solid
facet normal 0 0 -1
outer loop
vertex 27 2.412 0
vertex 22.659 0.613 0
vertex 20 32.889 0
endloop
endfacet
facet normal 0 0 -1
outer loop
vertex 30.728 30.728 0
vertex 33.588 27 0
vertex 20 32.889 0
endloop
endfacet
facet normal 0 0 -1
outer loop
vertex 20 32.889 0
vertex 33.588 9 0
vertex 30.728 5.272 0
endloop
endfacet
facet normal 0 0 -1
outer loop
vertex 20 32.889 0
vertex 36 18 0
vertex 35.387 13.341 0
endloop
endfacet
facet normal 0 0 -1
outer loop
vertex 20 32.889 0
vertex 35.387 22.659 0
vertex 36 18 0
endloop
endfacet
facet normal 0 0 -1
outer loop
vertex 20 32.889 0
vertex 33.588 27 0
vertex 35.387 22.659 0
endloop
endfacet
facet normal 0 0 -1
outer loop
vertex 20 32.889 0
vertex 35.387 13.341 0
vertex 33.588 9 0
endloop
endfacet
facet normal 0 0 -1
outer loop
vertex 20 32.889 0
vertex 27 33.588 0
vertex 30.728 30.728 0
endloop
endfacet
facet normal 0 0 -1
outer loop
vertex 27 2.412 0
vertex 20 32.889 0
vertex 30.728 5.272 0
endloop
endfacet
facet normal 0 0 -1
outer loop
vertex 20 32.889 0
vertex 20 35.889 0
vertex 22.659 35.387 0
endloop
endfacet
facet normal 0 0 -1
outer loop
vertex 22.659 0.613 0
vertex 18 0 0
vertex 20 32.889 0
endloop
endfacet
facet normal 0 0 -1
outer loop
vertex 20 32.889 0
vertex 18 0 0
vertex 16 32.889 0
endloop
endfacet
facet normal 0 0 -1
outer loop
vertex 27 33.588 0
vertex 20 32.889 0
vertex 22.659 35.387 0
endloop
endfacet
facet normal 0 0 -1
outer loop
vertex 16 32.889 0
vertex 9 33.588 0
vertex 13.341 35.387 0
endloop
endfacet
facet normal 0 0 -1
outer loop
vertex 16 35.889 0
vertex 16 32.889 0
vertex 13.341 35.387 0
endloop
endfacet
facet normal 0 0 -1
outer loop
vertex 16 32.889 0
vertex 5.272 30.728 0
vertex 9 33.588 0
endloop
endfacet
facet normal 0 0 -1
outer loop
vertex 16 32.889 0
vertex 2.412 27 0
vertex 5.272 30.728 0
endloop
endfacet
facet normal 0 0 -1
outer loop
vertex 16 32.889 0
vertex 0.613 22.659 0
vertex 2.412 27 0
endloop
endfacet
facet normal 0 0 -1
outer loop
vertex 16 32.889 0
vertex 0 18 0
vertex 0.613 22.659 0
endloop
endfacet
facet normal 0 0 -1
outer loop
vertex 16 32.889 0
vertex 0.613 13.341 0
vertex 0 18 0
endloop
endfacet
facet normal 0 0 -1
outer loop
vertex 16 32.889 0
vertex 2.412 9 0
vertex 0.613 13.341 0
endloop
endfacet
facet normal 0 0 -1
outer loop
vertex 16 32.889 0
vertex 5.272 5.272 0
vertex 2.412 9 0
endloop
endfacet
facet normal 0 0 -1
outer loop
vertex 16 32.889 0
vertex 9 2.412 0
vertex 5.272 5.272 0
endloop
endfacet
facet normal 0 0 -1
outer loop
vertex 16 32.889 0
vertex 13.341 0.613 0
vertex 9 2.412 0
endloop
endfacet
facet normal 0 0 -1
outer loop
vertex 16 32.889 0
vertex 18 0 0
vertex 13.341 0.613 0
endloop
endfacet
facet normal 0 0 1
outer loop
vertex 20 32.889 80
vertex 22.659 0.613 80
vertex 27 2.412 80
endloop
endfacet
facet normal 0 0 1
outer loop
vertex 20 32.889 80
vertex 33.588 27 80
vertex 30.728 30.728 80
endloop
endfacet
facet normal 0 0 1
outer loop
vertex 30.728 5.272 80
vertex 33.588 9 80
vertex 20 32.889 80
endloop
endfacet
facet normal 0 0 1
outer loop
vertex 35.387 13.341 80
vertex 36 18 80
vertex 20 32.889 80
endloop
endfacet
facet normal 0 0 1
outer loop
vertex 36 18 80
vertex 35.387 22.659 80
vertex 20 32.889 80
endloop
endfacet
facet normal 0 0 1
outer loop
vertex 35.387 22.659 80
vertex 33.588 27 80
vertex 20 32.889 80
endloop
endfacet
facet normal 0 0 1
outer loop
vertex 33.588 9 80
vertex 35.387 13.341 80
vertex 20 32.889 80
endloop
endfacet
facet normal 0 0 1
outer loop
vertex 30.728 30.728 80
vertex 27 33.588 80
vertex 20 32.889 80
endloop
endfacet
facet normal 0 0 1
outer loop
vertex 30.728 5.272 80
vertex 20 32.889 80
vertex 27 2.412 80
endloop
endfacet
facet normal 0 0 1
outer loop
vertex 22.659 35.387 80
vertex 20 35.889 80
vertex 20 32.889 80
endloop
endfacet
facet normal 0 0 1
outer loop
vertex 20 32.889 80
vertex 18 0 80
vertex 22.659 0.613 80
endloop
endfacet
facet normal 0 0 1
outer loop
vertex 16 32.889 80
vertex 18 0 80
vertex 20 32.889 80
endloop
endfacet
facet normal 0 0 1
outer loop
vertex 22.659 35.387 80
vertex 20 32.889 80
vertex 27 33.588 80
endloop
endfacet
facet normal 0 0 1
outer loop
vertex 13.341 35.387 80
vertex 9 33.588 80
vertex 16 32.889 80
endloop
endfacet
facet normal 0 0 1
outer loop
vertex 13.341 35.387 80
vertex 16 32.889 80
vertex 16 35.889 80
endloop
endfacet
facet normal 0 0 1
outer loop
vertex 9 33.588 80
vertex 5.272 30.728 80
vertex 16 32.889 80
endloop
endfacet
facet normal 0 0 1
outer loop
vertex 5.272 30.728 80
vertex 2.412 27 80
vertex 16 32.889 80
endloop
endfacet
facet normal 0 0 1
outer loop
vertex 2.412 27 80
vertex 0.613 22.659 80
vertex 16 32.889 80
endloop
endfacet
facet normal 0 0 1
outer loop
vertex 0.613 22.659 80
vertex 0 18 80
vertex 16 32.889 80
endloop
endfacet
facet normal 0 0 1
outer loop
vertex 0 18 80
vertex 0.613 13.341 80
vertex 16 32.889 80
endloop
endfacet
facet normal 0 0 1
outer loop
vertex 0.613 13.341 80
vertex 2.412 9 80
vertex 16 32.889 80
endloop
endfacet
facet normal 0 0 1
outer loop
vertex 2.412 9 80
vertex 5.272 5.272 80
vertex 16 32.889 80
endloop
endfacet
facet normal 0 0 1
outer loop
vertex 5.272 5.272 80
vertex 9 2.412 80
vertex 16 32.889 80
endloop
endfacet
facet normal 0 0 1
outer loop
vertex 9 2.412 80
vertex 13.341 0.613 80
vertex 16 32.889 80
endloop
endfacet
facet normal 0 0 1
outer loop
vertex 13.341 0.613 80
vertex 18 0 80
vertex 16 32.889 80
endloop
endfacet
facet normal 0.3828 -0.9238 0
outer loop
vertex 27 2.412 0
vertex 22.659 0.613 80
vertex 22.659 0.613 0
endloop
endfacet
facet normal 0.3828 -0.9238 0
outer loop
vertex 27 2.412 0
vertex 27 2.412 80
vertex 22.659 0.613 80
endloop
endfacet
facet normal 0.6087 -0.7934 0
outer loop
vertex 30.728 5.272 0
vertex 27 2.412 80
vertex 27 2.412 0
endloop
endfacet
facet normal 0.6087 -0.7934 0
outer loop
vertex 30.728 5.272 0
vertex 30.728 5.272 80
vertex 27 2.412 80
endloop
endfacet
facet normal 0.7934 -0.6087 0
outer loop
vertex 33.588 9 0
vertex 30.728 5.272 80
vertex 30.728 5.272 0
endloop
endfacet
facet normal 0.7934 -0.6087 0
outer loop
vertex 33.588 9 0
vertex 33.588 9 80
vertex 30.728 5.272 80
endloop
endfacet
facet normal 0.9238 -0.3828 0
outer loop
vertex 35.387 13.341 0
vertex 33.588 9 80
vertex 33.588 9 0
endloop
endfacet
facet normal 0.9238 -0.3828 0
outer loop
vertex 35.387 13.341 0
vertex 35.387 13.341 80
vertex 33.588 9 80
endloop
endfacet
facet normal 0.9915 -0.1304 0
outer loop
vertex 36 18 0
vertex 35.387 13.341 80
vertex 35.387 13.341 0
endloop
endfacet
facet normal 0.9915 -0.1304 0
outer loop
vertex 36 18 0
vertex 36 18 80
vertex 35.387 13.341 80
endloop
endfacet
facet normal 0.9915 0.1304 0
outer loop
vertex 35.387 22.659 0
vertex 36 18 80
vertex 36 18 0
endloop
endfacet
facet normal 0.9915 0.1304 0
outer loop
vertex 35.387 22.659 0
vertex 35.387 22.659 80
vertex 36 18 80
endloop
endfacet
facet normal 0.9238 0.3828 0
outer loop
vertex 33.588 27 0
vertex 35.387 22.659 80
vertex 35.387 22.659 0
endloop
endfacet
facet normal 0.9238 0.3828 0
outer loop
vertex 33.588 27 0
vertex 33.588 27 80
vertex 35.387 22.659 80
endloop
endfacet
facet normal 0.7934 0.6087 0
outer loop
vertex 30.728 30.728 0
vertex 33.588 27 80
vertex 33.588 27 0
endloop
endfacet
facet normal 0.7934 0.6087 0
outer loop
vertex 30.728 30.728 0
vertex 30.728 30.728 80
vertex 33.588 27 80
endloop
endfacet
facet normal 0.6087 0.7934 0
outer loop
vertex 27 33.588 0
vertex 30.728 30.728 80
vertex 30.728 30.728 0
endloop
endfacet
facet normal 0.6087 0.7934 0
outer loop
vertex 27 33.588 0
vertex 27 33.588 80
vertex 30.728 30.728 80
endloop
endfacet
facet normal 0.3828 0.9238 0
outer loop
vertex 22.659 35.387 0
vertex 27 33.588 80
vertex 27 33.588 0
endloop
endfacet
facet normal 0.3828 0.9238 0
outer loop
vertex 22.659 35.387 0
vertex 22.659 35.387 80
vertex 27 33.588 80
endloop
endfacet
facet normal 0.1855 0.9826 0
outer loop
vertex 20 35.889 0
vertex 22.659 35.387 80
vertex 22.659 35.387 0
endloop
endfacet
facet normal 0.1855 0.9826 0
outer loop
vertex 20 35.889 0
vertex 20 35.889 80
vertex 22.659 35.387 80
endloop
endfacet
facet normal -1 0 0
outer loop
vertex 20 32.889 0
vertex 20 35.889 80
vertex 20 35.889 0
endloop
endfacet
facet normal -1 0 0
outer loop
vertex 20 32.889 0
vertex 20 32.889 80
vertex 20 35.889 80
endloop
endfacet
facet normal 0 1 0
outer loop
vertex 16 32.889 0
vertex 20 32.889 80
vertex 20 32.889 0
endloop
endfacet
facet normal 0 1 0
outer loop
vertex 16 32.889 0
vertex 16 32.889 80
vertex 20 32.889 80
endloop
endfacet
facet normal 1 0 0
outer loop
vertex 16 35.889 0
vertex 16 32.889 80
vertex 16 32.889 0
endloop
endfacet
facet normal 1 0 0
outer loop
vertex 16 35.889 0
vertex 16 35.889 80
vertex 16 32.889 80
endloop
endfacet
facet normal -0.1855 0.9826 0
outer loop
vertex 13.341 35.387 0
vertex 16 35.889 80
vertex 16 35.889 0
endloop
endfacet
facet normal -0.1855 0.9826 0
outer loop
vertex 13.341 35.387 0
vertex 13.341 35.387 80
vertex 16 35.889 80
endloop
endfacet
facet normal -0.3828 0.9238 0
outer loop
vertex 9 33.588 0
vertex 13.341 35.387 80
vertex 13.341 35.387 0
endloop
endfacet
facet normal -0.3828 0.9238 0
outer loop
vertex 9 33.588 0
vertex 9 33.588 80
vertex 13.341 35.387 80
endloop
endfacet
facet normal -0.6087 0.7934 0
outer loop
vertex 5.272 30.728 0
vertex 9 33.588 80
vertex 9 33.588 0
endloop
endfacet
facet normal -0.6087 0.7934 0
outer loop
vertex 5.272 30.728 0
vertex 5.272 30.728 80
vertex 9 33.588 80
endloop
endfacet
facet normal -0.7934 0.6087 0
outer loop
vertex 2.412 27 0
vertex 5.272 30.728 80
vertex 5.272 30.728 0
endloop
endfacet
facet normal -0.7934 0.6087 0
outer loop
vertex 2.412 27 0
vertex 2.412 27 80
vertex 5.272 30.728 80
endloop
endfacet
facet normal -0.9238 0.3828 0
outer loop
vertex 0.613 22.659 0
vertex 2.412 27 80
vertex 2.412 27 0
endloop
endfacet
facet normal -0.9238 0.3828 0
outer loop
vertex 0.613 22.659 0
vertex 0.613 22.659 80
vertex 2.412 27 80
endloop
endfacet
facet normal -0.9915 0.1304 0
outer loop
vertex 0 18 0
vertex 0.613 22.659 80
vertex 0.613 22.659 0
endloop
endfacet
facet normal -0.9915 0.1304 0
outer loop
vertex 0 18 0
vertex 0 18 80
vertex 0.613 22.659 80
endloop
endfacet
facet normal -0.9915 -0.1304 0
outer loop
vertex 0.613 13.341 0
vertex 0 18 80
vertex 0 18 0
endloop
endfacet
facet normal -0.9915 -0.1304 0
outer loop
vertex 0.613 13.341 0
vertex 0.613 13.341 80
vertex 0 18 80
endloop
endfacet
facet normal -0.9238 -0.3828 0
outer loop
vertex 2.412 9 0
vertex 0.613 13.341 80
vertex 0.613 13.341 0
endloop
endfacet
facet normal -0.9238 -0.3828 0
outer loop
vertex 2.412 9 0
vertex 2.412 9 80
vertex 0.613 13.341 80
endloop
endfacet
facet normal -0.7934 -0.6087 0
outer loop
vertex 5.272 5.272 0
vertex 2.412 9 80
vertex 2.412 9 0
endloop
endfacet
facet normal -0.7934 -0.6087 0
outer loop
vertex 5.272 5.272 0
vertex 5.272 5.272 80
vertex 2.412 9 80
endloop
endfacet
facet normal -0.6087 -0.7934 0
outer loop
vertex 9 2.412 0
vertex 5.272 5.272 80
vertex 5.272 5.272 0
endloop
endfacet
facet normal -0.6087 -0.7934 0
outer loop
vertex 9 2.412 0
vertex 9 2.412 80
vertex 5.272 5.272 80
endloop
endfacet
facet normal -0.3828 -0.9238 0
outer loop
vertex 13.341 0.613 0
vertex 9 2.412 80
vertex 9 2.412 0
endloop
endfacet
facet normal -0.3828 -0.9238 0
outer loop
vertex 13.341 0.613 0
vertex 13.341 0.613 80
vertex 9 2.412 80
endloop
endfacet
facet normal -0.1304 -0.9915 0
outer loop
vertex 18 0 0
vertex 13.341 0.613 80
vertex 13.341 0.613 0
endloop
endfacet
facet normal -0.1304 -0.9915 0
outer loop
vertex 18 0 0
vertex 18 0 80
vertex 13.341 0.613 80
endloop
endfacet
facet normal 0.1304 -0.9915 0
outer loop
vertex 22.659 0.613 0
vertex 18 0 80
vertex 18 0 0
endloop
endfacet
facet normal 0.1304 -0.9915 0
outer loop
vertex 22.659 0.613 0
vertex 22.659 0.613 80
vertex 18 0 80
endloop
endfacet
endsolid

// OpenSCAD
$fn = 32;

// ----------------------------------------------------------------------
// Keyway shaft: d36 shaft, key 4 x 3 mm
// ----------------------------------------------------------------------

// --- parameters (mm) ---
shaft_r = 18;             // shaft radius
key_w = 4;                // keyway width
key_d = 3;                // keyway depth below the surface line
plate_t = 80;             // shaft length, Z (extrusion height)
fit_tol = 0.1;            // declared fit tolerance (prompt contract)
free_tol = 0.3;           // declared free tolerance (prompt contract)

shaft_d = 2 * shaft_r;  // shaft diameter
circle_step = 15;  // polygon sampling step, degrees

profile = [[13.341, 35.387], [9, 33.588], [5.272, 30.728], [2.412, 27], [0.613, 22.659], [0, 18], [0.613, 13.341], [2.412, 9], [5.272, 5.272], [9, 2.412], [13.341, 0.613], [18, 0], [22.659, 0.613], [27, 2.412], [30.728, 5.272], [33.588, 9], [35.387, 13.341], [36, 18], [35.387, 22.659], [33.588, 27], [30.728, 30.728], [27, 33.588], [22.659, 35.387], [20, 35.889], [20, 32.889], [16, 32.889], [16, 35.889]];  // primary outline, 27 points, counter clockwise

// --- the one profile operation ---
linear_extrude(height = plate_t) polygon(points = profile);
